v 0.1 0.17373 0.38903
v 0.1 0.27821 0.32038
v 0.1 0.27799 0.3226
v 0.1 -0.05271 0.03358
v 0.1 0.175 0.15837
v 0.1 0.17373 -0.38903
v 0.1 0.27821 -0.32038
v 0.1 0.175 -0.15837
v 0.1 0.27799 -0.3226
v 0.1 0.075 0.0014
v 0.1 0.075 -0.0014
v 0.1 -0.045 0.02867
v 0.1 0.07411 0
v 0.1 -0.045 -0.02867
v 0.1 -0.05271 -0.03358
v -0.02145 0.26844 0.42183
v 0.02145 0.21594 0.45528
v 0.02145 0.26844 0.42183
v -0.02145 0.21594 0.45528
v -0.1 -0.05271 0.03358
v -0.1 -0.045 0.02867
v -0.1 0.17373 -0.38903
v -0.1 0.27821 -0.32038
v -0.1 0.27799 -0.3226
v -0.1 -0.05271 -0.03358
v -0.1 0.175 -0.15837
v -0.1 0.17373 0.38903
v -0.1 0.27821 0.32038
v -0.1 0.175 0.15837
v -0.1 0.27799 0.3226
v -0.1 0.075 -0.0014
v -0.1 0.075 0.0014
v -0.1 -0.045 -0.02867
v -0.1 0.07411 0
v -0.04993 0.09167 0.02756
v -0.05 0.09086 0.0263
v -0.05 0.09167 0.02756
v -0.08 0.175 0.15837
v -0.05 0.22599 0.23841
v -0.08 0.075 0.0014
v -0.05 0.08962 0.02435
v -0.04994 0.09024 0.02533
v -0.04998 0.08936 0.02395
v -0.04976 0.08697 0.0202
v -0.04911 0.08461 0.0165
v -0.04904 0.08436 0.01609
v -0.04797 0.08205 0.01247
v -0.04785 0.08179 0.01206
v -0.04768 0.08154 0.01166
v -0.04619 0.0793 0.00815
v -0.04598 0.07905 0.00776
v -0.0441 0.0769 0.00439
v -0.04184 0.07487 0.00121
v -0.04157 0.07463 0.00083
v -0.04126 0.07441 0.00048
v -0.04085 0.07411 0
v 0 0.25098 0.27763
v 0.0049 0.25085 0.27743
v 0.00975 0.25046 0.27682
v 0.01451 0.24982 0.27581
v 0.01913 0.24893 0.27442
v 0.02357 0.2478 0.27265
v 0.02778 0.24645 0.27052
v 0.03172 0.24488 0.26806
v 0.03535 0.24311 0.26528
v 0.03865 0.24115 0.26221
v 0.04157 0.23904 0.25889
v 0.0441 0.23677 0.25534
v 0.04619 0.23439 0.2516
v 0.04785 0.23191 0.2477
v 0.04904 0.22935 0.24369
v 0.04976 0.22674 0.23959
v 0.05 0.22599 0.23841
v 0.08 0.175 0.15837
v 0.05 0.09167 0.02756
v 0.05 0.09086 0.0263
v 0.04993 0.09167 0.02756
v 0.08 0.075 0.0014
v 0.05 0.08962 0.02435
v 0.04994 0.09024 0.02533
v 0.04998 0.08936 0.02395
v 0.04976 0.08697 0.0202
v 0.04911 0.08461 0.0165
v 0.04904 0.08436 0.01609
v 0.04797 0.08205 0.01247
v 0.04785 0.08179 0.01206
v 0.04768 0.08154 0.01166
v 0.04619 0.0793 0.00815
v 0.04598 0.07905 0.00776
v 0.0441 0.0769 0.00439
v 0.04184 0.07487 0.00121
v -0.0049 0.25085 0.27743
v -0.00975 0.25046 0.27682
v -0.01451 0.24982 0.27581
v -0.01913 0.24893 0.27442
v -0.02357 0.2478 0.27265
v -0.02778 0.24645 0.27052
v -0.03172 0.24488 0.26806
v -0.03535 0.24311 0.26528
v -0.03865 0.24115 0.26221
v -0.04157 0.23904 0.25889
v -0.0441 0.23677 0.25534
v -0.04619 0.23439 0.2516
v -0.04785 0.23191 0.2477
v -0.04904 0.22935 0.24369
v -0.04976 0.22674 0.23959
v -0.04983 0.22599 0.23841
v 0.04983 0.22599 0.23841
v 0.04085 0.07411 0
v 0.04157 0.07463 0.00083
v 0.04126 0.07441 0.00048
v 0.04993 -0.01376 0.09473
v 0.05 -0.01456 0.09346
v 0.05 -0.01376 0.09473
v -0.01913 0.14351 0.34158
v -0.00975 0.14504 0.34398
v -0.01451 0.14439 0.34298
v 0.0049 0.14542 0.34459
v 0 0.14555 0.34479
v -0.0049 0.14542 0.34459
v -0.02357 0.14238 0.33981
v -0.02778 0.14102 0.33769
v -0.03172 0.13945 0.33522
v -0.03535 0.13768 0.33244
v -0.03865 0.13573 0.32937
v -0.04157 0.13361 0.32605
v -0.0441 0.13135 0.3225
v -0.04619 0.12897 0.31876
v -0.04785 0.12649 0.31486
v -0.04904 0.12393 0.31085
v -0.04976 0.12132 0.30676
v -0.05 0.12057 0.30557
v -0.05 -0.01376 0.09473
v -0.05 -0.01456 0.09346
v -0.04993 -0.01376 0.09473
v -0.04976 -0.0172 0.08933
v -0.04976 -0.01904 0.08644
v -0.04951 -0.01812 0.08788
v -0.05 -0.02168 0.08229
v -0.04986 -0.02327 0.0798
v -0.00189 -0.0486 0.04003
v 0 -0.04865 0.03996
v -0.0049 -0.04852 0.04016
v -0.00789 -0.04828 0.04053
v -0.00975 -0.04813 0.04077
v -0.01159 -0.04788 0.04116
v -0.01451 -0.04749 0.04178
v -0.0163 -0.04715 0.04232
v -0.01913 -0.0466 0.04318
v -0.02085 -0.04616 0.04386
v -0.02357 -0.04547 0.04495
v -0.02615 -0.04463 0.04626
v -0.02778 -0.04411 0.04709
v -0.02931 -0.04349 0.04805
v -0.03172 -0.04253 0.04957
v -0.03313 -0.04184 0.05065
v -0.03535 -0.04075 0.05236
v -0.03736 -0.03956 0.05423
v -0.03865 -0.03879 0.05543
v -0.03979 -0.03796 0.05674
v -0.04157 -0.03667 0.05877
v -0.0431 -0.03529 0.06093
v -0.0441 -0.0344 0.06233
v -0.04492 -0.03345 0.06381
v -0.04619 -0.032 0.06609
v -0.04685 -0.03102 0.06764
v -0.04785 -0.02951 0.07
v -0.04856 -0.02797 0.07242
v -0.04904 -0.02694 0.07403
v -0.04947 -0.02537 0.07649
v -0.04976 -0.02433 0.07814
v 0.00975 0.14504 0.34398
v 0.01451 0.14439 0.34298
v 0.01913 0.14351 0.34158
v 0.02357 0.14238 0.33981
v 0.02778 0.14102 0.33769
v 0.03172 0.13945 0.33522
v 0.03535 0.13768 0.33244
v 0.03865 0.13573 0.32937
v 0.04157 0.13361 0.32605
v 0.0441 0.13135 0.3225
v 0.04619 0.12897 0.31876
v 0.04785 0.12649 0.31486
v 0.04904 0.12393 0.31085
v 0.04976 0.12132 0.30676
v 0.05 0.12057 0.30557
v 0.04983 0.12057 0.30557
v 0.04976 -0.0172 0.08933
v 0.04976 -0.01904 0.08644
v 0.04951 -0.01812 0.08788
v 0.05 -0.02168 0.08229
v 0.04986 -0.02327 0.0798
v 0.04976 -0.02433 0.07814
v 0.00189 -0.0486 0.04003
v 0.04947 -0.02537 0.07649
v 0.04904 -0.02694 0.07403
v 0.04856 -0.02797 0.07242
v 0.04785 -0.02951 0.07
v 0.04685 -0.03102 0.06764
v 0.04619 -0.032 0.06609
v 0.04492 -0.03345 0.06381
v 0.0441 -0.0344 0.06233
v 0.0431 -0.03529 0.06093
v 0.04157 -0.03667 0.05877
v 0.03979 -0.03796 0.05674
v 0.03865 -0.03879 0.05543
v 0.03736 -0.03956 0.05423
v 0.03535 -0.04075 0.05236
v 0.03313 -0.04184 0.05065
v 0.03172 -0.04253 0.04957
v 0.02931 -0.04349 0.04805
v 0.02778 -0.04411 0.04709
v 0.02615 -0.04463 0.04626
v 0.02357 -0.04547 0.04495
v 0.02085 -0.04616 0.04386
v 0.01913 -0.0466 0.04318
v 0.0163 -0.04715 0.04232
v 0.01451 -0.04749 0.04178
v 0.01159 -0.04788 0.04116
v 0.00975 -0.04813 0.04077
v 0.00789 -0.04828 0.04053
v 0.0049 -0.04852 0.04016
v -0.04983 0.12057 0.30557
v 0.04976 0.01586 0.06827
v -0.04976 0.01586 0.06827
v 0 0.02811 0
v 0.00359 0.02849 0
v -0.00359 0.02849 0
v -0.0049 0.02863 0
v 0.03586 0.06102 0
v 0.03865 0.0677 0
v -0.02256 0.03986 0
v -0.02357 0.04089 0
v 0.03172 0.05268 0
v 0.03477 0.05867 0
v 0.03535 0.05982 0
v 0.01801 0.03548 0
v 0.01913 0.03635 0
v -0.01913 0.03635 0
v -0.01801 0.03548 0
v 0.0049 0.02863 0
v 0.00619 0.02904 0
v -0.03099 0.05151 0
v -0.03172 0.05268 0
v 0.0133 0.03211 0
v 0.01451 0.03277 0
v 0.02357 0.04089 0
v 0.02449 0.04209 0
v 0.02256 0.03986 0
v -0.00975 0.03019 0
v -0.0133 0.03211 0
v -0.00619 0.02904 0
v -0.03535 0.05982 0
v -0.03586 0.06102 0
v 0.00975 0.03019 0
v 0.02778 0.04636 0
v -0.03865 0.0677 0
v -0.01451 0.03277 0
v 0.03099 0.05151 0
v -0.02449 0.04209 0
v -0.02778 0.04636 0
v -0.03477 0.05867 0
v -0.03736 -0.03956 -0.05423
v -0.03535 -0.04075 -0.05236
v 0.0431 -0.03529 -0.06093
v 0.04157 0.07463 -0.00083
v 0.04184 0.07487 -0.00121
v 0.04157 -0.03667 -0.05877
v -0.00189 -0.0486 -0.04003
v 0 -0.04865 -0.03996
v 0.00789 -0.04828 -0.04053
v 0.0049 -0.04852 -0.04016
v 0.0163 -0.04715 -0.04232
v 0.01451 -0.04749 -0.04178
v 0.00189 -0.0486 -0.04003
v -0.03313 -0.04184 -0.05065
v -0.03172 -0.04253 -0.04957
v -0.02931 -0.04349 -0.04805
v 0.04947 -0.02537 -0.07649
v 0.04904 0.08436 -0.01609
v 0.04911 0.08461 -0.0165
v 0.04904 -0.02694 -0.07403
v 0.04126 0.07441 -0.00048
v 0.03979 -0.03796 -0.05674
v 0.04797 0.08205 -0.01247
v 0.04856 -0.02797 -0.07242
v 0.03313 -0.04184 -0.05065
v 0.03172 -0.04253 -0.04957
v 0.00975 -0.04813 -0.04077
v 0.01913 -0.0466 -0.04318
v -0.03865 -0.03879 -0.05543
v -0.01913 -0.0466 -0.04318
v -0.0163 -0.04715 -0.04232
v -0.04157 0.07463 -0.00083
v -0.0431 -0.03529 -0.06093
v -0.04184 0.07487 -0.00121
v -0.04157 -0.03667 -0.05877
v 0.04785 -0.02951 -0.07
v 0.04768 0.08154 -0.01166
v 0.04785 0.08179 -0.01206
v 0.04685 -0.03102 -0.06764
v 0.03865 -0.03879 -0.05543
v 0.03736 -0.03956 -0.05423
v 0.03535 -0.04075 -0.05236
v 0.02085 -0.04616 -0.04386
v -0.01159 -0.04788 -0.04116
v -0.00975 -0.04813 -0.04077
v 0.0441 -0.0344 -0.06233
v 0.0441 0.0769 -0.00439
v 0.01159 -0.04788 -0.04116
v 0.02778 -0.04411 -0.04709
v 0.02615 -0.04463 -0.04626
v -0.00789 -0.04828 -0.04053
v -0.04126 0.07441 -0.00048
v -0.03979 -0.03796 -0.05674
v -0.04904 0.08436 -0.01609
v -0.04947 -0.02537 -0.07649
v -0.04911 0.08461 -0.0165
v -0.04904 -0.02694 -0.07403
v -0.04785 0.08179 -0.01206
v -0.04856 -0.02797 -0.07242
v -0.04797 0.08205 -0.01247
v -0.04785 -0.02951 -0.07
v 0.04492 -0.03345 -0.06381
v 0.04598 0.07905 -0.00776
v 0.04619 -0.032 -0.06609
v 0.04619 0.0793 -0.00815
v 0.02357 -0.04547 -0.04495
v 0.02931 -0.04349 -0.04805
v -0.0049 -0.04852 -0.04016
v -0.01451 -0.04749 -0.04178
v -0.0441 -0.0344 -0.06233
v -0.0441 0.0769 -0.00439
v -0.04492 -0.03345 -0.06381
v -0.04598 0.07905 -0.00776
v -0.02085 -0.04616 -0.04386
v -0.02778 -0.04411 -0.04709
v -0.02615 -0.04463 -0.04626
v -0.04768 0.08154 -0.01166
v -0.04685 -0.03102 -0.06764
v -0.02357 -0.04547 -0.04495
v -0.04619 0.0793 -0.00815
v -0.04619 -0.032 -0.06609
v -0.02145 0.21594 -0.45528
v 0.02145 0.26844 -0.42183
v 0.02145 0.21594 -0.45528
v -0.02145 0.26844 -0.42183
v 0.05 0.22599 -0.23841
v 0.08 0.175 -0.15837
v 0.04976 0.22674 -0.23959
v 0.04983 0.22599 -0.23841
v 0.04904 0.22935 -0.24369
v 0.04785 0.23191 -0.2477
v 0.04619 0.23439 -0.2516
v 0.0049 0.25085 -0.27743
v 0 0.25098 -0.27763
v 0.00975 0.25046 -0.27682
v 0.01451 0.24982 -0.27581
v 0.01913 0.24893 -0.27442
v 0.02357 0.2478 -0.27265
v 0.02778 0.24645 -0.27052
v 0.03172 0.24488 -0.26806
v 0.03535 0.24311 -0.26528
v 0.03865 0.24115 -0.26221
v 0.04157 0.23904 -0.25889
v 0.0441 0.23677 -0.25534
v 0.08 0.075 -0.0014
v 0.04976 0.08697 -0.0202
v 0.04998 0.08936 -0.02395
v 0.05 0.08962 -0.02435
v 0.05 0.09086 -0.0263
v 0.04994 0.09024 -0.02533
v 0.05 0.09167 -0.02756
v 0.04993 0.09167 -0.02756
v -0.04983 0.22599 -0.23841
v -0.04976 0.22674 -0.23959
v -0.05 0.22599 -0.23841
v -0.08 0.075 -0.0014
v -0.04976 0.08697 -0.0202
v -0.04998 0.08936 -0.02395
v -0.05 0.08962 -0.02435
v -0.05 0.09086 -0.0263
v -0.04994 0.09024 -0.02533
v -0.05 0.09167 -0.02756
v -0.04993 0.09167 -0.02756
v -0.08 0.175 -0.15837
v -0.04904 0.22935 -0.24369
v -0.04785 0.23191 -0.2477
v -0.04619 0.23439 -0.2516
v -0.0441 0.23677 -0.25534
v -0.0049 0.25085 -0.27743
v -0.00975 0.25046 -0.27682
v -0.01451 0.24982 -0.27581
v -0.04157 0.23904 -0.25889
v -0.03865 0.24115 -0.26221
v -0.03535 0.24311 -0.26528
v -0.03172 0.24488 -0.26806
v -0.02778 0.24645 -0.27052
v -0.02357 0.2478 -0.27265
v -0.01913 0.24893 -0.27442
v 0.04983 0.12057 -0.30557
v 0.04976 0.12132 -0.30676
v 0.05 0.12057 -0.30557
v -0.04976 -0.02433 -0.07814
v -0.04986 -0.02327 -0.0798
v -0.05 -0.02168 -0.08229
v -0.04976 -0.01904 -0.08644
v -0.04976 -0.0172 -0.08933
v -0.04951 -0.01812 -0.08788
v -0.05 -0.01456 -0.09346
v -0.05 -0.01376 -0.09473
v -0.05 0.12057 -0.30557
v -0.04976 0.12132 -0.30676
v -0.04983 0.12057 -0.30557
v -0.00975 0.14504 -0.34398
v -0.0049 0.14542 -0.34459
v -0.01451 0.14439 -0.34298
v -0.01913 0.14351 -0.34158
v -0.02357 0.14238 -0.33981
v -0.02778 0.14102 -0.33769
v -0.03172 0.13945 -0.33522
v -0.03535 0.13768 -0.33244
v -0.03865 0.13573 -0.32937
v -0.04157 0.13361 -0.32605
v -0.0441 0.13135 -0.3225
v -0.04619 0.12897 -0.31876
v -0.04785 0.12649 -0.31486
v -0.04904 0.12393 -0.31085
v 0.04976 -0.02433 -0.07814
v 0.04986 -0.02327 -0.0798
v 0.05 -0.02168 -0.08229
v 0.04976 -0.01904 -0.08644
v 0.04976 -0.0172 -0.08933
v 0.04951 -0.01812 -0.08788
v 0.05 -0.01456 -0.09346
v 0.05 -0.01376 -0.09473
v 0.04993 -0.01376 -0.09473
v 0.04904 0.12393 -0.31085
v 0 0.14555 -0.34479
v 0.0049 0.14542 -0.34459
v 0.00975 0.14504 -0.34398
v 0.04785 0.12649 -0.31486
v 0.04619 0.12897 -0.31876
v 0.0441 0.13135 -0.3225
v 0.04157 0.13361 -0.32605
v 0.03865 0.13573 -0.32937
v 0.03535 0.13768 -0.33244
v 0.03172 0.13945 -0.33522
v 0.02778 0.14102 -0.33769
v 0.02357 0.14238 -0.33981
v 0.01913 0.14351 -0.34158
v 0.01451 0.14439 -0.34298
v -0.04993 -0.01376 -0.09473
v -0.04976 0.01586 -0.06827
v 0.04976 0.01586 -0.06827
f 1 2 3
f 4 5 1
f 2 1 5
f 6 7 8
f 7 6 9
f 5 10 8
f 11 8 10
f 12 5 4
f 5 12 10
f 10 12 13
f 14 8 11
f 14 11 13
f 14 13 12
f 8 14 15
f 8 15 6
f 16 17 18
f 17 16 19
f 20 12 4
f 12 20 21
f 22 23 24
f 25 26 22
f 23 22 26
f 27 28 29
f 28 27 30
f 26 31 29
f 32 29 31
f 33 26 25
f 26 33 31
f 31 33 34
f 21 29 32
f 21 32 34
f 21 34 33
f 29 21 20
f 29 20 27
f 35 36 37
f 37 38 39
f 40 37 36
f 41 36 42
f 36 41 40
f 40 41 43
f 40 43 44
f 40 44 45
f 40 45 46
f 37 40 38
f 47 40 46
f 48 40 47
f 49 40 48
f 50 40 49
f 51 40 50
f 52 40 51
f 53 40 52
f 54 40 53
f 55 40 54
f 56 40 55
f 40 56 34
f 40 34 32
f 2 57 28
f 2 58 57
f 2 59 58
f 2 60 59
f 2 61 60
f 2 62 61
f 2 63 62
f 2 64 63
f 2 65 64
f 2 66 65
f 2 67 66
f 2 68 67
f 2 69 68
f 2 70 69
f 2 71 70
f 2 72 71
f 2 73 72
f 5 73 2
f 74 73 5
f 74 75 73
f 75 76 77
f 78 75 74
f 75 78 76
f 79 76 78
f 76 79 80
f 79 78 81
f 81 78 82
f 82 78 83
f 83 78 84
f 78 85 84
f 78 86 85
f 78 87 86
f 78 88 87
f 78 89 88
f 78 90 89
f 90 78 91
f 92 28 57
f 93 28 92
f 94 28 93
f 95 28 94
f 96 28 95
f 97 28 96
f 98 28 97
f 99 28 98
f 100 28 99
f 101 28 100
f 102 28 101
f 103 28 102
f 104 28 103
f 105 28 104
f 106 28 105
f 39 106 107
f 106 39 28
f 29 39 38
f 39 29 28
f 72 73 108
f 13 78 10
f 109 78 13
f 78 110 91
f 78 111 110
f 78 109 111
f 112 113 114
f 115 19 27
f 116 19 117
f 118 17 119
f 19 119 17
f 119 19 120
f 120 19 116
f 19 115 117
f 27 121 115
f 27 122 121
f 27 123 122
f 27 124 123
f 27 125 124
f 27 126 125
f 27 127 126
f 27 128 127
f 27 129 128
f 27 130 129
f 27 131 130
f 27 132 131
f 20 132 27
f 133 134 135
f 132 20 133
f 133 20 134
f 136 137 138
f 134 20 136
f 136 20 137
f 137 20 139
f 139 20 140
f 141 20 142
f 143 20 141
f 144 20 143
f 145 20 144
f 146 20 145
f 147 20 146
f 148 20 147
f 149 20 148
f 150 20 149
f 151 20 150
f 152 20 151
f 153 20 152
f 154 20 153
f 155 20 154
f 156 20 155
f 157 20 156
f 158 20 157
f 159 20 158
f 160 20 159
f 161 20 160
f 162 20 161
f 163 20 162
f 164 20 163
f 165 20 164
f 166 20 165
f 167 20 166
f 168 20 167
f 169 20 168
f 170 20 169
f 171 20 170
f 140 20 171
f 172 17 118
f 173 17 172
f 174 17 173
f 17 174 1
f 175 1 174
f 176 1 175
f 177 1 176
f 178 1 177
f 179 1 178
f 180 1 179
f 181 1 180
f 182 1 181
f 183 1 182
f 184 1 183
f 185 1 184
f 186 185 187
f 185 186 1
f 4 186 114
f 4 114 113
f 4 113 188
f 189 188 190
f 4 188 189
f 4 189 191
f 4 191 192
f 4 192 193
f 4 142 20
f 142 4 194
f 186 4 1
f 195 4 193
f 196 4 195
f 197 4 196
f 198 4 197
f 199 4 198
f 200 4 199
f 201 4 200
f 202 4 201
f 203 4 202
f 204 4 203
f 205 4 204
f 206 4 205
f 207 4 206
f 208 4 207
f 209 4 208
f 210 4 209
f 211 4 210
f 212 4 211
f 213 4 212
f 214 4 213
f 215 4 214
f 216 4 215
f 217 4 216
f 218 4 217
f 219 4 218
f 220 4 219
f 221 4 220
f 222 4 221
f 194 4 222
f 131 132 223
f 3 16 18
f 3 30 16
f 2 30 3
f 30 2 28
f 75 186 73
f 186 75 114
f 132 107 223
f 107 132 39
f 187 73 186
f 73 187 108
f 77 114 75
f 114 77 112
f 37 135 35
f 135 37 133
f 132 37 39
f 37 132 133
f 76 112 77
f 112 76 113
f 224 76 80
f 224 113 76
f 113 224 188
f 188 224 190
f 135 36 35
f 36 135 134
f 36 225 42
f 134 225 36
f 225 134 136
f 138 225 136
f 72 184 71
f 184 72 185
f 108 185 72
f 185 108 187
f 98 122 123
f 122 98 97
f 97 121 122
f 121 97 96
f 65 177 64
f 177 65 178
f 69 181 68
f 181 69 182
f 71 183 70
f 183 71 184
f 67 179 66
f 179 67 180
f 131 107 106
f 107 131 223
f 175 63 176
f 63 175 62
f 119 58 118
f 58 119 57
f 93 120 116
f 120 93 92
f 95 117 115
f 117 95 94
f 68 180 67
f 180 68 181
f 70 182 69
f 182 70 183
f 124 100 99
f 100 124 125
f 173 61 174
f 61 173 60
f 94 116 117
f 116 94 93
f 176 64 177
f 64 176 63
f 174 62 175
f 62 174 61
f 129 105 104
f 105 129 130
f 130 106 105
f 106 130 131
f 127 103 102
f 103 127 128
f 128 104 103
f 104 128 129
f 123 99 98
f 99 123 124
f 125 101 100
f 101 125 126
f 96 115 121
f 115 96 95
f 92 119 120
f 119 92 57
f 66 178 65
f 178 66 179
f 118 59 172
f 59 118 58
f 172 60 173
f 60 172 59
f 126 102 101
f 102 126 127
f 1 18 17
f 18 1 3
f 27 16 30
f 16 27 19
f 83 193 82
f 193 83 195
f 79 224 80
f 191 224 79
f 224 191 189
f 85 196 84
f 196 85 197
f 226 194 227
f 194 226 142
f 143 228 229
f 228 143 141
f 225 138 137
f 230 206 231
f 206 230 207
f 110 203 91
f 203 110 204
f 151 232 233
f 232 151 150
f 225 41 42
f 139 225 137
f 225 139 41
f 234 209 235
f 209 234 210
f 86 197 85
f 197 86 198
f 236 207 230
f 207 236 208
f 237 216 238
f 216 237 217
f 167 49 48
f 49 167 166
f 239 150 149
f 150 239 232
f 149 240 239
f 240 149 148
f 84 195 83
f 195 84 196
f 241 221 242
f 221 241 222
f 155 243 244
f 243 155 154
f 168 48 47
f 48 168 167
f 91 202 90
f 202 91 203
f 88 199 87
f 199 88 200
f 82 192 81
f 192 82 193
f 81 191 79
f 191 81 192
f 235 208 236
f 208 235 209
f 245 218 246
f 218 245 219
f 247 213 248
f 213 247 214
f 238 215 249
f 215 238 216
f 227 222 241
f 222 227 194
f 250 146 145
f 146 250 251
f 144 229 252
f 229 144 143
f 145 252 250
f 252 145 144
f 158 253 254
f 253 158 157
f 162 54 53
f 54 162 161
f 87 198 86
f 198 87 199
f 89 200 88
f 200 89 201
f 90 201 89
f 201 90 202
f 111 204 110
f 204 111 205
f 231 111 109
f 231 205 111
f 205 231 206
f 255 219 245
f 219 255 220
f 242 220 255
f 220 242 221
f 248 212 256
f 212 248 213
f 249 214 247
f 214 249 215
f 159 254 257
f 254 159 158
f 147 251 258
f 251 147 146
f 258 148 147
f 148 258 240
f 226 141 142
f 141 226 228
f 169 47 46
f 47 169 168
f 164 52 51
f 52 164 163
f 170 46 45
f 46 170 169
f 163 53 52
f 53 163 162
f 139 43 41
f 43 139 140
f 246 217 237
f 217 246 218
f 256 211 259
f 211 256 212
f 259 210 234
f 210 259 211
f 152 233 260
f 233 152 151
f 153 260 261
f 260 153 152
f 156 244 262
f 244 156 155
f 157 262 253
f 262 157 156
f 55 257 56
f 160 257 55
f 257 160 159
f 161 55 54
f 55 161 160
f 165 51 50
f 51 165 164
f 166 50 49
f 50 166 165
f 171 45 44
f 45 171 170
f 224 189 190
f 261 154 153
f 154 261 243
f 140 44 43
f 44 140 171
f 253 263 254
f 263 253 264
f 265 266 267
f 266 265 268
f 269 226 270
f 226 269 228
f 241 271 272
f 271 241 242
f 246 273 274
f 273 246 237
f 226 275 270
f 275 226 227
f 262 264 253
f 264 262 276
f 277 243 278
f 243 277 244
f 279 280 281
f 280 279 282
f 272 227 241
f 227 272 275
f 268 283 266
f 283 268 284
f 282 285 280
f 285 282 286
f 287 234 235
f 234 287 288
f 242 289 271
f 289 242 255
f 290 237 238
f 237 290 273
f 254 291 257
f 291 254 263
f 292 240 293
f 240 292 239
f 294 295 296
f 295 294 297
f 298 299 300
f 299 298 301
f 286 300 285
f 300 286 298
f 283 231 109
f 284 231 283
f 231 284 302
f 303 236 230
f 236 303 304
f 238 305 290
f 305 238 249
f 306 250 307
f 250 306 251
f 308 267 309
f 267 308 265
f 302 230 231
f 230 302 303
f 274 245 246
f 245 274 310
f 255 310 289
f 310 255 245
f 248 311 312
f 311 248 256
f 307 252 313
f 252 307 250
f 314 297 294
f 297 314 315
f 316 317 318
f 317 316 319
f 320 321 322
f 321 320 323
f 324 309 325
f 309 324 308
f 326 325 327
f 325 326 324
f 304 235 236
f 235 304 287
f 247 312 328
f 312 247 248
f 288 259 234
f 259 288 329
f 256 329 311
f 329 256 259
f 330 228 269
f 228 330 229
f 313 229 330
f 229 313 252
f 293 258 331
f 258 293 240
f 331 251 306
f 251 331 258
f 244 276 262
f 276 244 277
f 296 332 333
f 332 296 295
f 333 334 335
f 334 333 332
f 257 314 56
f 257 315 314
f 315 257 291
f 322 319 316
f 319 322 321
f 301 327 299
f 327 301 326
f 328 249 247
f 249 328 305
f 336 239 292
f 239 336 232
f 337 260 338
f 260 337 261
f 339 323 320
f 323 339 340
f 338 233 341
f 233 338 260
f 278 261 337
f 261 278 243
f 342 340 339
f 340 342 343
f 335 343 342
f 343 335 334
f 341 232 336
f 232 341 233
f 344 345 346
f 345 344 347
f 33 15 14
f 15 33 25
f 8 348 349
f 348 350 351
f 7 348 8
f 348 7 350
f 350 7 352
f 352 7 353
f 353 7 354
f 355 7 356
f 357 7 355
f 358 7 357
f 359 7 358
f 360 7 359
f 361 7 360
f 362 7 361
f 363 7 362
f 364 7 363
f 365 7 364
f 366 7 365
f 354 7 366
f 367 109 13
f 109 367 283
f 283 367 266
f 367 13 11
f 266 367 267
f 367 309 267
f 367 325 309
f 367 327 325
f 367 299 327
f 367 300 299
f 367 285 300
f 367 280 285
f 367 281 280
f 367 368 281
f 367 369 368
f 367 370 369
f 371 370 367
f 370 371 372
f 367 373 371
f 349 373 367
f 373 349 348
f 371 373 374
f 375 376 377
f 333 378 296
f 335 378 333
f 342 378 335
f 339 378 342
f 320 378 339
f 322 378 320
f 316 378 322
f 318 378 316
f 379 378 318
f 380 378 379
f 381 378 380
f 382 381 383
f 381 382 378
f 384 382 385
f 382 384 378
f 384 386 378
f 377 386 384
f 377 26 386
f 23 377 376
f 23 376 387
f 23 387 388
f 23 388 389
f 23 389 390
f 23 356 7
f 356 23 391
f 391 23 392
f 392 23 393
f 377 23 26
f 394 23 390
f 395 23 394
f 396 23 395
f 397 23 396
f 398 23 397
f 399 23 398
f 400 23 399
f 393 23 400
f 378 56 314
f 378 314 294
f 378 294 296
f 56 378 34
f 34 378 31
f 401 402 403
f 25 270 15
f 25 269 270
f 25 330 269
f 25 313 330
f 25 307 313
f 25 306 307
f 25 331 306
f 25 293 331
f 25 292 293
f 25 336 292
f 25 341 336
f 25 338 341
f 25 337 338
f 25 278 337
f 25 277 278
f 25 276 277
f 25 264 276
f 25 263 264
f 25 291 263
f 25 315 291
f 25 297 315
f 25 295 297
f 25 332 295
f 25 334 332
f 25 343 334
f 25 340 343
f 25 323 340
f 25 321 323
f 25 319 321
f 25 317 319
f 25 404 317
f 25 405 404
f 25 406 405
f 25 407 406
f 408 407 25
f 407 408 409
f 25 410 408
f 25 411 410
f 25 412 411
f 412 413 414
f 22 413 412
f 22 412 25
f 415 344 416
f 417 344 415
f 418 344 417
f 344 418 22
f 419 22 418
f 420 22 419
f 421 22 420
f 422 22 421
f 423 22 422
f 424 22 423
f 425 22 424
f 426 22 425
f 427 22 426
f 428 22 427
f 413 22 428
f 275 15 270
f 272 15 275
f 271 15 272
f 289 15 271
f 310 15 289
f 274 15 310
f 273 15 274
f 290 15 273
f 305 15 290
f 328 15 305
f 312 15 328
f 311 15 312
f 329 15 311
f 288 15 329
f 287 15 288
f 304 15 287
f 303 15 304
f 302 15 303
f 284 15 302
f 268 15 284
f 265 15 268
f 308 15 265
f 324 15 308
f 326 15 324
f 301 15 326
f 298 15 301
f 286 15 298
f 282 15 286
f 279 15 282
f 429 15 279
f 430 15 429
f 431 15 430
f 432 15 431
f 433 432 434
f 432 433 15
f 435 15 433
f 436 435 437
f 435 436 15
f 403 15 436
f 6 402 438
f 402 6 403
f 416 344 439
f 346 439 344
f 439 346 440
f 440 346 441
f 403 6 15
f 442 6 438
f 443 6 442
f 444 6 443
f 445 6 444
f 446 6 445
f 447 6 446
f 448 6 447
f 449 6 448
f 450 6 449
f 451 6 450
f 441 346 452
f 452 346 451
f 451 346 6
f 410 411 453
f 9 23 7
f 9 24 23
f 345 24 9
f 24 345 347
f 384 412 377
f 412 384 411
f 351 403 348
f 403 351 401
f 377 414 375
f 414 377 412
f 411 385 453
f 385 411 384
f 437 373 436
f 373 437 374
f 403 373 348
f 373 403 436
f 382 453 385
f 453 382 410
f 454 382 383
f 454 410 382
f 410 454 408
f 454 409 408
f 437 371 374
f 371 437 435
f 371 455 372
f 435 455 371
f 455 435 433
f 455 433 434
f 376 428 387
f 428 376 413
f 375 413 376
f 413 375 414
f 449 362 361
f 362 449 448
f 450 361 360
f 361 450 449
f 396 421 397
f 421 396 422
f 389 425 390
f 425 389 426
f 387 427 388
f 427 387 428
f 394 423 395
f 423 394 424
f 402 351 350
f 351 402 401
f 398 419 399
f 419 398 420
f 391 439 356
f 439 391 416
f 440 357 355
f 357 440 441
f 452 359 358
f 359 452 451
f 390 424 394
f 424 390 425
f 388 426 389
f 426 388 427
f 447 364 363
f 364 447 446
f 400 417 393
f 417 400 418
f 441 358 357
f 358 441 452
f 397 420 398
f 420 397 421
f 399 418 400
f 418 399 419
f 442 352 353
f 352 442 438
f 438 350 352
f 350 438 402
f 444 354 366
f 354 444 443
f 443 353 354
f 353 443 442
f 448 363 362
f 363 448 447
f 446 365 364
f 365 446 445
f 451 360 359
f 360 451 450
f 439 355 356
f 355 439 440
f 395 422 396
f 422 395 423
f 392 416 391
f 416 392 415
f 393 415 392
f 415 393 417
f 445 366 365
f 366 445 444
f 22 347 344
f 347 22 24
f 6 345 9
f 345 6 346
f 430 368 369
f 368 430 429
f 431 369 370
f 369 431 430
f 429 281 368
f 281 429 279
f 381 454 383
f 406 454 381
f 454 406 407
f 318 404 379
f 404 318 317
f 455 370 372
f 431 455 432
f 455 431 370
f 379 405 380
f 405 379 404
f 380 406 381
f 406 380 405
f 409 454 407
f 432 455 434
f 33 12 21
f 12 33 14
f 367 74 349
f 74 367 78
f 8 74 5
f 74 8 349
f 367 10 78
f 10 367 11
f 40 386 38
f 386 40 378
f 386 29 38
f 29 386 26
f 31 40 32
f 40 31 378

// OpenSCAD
// file: Robot_Body_008.scad
// ----------------------------------------------------------------------------------------------------
// PROJECT INFORMATION

// NAME:  Robot Body
// REVISION:  A1
// START DATE:  7/4/2023
// CURRENT VERSION DATE:  7/12/2023
// LICENSE:  GPLv3
// AUTHOR:  Justin Grimes (@zelon88)
// DESCRIPTION:  A body for tracked robot.
// ----------------------------------------------------------------------------------------------------

// ----------------------------------------------------------------------------------------------------
// PART INFORMATION

// NAME:  Robot Body Fastener Half
// REVISION:  A1
// START DATE:  7/11/2023
// CURRENT VERSION DATE:  7/12/2023
// AUTHOR:  Justin Grimes (@zelon88)
// DESCRIPTION:  
//    A fastener for joining body panels together.
//    The purpose of this part is to modularize the design of body fasteners.
//    This part does not need to be printed.
// FILE NAME: Robot_Body_008.scad
// ----------------------------------------------------------------------------------------------------

// ----------------------------------------------------------------------------------------------------
// PRINTER CONFIGURATION

// ----------------------------------------------------------------------------------------------------

// ----------------------------------------------------------------------------------------------------
// MANUFACTURING INSTRUCTIONS

// ----------------------------------------------------------------------------------------------------

// ----------------------------------------------------------------------------------------------------
// MODULES

// ----------------------------------------------------------------------------------------------------

// ----------------------------------------------------------------------------------------------------
// GEOMETRY

// 45 Degree Body Fastener.
difference() { 
  // Body of Fastener.
  translate([0, 0, 0.25]) cube([0.2, 0.125, 0.5], center=true);

  // Tapered Edge.
  translate([0, 0.04, 0.55]) rotate([38, 0, 0]) cube([0.5, 0.125, .5], center=true);

  // Upper Slot.
  translate([0, 0, 0.1975]) cube([0.1, 0.125, .25], center=true);

  // Inner Radius of Slot.
  translate([0, 0, 0.071]) rotate([90, 0, 0]) cylinder(r=0.05, h=0.125, $fn=64, center=true);

  // Outer Radius of Slot.
  translate([0, 0, 0.319]) rotate([90, 0, 0]) cylinder(r=0.05, h=0.125, $fn=64, center=true);

  // Edge Chamfers.
  translate([0.3125, 0, 0.5625]) rotate([0, 45, 0]) cube([0.5, 0.5, 0.5], center=true);
  translate([-0.3125, 0, 0.5625]) rotate([0, 45, 0]) cube([0.5, 0.5, 0.5], center=true); }
// ----------------------------------------------------------------------------------------------------
// main file
// ----------------------------------------------------------------------------------------------------
// PROJECT INFORMATION

// NAME:  Robot Body
// REVISION:  A1
// START DATE:  7/4/2023
// CURRENT VERSION DATE:  7/12/2023
// LICENSE:  GPLv3
// AUTHOR:  Justin Grimes (@zelon88)
// DESCRIPTION:  A body for tracked robot.
// ----------------------------------------------------------------------------------------------------

// ----------------------------------------------------------------------------------------------------
// PART INFORMATION

// NAME:  Robot Body 65 Degree Fastener
// REVISION:  A1
// START DATE:  7/11/2023
// CURRENT VERSION DATE:  7/12/2023
// AUTHOR:  Justin Grimes (@zelon88)
// DESCRIPTION:  
//    A fastener for joining body panels together.
// FILE NAME: Robot_Body_012.scad
// ----------------------------------------------------------------------------------------------------

// ----------------------------------------------------------------------------------------------------
// PRINTER CONFIGURATION

// ----------------------------------------------------------------------------------------------------

// ----------------------------------------------------------------------------------------------------
// MANUFACTURING INSTRUCTIONS

// ----------------------------------------------------------------------------------------------------

// ----------------------------------------------------------------------------------------------------
// MODULES

// ----------------------------------------------------------------------------------------------------

// ----------------------------------------------------------------------------------------------------
// GEOMETRY

// 65 Degree Body Fastener.

// Load the modular fastner portion "Robot_Body_008.scad" and rotate it.
difference() { 
  rotate([-32.5, 0, 0]) include <Robot_Body_008.scad>;

  // Clean Up Inner Slot.
  translate([0, 0, 0.071]) rotate([62.5, 0, 0]) cylinder(r=0.05, h=0.25, $fn=64, center=true); 
  // Clean Up Outer Slot.
  translate([0, 0, -0.071]) rotate([117.5, 0, 0]) cylinder(r=0.05, h=0.25, $fn=64, center=true); }

difference() { 
  rotate([-32.5, 180, 0]) include <Robot_Body_008.scad>;

  // Clean Up Inner Slot.
  translate([0, 0, 0.071]) rotate([62.5, 0, 0]) cylinder(r=0.05, h=0.25, $fn=64, center=true); 
  // Clean Up Outer Slot.
  translate([0, 0, -0.071]) rotate([117.5, 0, 0]) cylinder(r=0.05, h=0.25, $fn=64, center=true); }

// Fill In The Center Gap.
difference() { 
  cube([0.2, 0.09, 0.09], center=true);

  // Clean Up Inner Slot.
  translate([0, 0, 0.071]) rotate([62.5, 0, 0]) cylinder(r=0.05, h=0.25, $fn=64, center=true); 
  // Clean Up Outer Slot.
  translate([0, 0, -0.071]) rotate([117.5, 0, 0]) cylinder(r=0.05, h=0.25, $fn=64, center=true); }

// Add side Reinforcements.
translate([0.09, 0.125, -0.05]) rotate([0, 0, 0]) cube([0.02, 0.1, 0.2375], center=true);
translate([0.09, 0.125, 0.05]) rotate([0, 0, 0]) cube([0.02, 0.1, 0.2375], center=true);
translate([-0.09, 0.125, 0.05]) rotate([0, 0, 0]) cube([0.02, 0.1, 0.2375], center=true);
translate([-0.09, 0.125, -0.05]) rotate([0, 0, 0]) cube([0.02, 0.1, 0.2375], center=true); 
// ----------------------------------------------------------------------------------------------------
